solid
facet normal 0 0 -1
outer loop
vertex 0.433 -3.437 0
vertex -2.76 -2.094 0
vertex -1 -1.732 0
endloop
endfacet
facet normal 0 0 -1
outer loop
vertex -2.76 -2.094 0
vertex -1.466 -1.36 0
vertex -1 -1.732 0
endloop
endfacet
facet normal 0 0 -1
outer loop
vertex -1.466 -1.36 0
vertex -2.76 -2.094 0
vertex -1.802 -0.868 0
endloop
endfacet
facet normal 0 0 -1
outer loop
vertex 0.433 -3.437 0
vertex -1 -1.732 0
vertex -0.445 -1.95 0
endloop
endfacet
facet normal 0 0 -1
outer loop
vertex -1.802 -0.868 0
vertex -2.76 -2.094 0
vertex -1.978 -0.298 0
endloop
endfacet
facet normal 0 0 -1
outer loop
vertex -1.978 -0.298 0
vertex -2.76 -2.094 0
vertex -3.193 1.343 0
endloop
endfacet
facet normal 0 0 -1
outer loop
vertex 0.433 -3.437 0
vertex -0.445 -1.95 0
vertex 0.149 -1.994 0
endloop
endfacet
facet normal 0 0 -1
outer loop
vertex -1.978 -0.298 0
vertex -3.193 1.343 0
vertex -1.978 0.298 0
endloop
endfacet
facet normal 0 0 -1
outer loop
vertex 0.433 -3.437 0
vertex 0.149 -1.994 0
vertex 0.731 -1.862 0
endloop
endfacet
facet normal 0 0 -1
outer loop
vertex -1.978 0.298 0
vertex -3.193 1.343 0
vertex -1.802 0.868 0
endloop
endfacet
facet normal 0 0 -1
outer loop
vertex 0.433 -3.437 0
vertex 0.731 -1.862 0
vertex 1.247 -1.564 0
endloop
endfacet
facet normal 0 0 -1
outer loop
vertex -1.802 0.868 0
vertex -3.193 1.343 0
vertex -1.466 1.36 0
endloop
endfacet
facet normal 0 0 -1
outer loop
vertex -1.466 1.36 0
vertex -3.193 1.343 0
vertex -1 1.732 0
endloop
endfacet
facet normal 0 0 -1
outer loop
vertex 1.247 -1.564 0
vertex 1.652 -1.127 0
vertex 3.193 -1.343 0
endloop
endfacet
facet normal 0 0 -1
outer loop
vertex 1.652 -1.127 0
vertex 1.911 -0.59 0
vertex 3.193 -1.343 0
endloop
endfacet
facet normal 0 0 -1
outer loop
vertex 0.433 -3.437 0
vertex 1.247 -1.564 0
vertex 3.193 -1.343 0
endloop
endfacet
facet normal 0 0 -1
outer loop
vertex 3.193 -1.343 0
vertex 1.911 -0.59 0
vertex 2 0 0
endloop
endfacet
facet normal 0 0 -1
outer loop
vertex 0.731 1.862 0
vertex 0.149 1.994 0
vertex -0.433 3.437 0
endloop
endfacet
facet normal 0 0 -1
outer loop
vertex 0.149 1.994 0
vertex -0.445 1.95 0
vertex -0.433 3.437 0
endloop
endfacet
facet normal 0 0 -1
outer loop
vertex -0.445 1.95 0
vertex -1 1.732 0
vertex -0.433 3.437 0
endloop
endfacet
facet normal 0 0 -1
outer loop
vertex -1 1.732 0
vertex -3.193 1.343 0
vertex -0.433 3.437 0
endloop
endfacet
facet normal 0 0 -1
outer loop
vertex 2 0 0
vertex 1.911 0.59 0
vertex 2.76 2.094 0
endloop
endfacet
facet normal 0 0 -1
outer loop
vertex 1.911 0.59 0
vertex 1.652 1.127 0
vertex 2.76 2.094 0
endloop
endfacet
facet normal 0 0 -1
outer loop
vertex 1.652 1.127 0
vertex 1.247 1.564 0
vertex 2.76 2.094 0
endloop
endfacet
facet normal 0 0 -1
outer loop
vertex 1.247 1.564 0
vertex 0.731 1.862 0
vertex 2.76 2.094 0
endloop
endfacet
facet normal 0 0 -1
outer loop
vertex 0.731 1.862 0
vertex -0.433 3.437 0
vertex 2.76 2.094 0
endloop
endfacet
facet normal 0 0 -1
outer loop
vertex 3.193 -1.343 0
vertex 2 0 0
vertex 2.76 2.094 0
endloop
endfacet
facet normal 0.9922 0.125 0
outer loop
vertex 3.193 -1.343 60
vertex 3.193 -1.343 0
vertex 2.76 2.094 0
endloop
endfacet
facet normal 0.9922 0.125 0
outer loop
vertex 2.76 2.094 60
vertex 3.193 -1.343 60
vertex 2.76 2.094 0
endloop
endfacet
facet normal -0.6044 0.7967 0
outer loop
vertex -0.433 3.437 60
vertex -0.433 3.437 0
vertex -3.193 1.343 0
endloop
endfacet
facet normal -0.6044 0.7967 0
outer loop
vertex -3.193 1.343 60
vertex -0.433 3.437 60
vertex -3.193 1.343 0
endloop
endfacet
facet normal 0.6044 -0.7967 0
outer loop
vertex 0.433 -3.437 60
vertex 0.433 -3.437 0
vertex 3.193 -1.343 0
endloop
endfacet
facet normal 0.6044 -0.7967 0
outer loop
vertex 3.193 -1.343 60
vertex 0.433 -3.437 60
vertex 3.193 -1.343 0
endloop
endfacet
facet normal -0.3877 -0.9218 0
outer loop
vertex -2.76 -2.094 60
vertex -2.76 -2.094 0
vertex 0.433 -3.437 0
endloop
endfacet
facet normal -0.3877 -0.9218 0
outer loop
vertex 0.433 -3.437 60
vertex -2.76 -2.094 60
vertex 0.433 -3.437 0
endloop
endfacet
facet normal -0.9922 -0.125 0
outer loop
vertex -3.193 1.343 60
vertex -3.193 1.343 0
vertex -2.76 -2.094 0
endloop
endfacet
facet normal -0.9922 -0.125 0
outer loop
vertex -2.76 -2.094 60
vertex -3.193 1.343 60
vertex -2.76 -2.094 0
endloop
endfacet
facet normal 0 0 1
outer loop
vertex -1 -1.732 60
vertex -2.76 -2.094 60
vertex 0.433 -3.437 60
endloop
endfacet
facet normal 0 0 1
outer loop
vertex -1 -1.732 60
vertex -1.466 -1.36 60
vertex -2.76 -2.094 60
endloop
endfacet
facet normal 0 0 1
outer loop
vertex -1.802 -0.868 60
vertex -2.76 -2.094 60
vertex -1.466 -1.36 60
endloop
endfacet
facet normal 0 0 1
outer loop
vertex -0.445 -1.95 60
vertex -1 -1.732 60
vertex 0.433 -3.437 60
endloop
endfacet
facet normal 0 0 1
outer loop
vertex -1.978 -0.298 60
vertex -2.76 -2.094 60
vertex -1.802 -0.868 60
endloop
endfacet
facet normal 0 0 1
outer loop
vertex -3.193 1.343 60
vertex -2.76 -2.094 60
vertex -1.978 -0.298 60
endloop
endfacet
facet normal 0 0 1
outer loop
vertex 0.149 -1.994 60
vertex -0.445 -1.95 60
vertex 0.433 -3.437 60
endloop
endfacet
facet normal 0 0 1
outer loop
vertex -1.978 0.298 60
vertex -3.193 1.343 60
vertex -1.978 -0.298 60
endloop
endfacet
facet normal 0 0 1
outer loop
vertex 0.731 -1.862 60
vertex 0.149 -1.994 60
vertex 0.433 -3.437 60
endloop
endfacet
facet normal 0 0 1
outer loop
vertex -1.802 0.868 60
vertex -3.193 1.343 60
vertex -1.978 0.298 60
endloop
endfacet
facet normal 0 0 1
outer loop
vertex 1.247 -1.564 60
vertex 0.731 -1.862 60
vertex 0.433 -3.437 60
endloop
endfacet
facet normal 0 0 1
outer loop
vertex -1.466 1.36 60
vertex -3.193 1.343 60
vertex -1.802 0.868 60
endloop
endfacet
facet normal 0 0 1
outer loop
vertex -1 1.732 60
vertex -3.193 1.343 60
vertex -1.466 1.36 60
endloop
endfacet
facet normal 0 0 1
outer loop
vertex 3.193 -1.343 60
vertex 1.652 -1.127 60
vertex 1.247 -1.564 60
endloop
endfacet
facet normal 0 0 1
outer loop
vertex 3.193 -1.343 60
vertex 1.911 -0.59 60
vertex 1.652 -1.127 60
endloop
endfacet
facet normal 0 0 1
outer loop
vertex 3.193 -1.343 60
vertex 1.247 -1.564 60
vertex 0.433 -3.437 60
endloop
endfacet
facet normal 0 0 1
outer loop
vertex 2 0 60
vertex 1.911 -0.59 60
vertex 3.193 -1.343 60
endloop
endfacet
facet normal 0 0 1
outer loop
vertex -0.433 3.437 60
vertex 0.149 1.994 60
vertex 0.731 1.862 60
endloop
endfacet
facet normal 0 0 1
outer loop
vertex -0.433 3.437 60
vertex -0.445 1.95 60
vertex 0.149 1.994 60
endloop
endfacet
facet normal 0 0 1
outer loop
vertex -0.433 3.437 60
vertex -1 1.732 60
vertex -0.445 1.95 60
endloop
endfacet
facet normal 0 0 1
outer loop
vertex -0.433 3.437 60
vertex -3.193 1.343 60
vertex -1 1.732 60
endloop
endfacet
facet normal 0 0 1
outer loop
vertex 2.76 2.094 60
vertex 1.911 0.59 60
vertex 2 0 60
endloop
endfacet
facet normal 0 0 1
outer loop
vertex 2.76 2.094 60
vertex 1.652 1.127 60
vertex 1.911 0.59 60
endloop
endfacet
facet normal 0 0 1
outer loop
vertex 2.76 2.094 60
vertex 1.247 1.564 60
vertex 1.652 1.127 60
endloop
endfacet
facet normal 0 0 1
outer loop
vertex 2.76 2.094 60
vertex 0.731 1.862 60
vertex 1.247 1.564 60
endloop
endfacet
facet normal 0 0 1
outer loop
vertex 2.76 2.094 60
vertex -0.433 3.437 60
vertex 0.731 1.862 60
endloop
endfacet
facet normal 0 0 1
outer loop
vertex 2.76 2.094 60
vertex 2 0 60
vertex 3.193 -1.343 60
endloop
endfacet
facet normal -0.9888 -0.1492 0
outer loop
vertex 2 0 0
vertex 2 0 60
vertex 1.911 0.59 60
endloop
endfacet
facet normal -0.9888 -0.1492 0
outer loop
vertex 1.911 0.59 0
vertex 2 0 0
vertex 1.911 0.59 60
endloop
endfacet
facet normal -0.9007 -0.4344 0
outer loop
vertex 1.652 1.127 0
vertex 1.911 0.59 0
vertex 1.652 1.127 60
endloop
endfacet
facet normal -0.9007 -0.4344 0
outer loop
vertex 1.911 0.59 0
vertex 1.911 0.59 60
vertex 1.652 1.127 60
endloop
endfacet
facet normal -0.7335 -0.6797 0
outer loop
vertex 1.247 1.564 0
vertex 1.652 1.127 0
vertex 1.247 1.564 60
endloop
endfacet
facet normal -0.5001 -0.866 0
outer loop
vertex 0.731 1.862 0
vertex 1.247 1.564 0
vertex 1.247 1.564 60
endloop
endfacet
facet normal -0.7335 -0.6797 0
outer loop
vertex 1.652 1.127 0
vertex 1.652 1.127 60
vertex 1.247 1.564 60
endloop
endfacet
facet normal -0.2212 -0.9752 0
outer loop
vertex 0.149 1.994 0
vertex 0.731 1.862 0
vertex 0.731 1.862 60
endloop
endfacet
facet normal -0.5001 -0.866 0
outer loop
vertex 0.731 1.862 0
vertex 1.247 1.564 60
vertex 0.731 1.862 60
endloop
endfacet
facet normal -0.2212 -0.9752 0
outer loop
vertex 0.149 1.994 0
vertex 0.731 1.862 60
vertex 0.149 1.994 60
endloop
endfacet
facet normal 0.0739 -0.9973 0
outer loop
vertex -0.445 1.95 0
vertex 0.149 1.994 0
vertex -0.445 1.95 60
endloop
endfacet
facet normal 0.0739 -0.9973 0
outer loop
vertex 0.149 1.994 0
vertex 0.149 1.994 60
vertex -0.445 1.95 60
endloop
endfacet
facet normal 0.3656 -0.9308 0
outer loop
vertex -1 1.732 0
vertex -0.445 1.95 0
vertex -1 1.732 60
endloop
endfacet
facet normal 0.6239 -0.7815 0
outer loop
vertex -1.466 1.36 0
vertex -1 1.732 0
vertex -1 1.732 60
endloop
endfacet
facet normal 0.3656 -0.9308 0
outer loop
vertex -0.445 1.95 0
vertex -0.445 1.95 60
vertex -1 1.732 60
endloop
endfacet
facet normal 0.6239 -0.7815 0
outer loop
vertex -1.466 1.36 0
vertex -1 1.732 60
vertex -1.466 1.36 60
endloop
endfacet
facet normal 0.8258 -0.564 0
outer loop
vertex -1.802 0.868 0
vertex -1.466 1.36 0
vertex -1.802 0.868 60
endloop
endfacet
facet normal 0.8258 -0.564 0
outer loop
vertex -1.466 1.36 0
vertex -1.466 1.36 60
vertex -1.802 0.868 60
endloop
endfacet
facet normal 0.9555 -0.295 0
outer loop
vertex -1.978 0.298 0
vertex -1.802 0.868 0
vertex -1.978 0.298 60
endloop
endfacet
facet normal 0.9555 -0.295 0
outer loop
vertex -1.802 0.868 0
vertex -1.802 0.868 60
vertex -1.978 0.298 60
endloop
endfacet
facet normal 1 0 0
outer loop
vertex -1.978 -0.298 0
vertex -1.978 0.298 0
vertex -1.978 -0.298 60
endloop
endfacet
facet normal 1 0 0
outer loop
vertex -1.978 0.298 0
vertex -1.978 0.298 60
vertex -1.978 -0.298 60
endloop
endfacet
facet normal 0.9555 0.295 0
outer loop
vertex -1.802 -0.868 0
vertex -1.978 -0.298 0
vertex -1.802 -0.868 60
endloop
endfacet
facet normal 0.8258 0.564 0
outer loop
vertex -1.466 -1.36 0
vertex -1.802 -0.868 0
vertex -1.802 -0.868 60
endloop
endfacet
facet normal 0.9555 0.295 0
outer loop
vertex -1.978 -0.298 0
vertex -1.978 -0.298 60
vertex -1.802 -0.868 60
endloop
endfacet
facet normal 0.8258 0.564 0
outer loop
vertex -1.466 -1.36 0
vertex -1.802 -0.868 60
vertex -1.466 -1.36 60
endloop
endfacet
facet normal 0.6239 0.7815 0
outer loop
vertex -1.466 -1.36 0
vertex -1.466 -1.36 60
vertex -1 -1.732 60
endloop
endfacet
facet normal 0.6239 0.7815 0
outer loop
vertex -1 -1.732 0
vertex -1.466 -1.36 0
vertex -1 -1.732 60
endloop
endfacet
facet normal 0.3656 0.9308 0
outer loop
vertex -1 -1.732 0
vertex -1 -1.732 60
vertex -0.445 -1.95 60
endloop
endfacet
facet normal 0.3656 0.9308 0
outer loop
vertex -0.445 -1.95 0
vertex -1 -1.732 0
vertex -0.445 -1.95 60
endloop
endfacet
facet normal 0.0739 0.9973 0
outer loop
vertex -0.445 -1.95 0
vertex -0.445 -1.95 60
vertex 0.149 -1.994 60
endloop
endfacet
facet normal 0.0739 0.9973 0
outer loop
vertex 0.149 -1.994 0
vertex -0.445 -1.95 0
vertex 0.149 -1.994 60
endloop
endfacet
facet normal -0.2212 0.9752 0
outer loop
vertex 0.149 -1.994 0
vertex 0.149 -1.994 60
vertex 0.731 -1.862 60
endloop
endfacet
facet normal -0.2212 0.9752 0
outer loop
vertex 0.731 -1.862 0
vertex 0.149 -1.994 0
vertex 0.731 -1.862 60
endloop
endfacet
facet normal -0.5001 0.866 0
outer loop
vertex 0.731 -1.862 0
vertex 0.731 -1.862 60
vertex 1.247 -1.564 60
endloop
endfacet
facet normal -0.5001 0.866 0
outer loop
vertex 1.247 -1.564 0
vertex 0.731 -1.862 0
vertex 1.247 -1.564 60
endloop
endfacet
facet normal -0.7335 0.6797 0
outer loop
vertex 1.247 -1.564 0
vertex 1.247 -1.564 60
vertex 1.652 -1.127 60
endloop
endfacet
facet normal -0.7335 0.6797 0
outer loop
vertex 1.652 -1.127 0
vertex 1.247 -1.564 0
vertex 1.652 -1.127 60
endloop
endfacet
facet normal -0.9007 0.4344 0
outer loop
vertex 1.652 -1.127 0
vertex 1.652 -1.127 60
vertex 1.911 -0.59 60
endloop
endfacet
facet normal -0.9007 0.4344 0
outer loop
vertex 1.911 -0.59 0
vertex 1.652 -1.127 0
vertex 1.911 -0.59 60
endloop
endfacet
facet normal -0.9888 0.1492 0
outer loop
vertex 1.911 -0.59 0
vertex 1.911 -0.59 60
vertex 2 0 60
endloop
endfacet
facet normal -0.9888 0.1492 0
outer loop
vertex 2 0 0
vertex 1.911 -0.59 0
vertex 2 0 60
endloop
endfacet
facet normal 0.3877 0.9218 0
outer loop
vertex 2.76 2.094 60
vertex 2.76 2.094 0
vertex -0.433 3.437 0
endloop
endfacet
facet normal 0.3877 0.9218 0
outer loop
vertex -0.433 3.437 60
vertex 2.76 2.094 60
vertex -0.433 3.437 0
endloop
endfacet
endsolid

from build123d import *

# Parameters (mm, degrees)
EXTRUDE_1_DEPTH          = 60
SKETCH_2_R               = 2
CUT_EXTRUDE_1_DEPTH      = 1
CUT_EXTRUDE_1_DEPTH_BACK = 61


with BuildPart() as part:
    # 草图1 → 凸台-拉伸1 (new body)
    with BuildSketch(Plane.XY):
        Polygon((2.759819518, 2.093656186), (-0.433249685, 3.436901906), (-3.193069203, 1.34324572), (-2.759819518, -2.093656186), (0.433249685, -3.436901906), (3.193069203, -1.34324572), align=None)
    extrude(amount=EXTRUDE_1_DEPTH)

    # 草图2 → 切除-拉伸1 (cut, two sides)
    with BuildSketch(Plane.XY.offset(60)) as cut_extrude_1_sk:
        Circle(SKETCH_2_R)
    extrude(amount=CUT_EXTRUDE_1_DEPTH, mode=Mode.SUBTRACT)
    extrude(cut_extrude_1_sk.sketch, amount=-CUT_EXTRUDE_1_DEPTH_BACK, mode=Mode.SUBTRACT)


solid = part.part
